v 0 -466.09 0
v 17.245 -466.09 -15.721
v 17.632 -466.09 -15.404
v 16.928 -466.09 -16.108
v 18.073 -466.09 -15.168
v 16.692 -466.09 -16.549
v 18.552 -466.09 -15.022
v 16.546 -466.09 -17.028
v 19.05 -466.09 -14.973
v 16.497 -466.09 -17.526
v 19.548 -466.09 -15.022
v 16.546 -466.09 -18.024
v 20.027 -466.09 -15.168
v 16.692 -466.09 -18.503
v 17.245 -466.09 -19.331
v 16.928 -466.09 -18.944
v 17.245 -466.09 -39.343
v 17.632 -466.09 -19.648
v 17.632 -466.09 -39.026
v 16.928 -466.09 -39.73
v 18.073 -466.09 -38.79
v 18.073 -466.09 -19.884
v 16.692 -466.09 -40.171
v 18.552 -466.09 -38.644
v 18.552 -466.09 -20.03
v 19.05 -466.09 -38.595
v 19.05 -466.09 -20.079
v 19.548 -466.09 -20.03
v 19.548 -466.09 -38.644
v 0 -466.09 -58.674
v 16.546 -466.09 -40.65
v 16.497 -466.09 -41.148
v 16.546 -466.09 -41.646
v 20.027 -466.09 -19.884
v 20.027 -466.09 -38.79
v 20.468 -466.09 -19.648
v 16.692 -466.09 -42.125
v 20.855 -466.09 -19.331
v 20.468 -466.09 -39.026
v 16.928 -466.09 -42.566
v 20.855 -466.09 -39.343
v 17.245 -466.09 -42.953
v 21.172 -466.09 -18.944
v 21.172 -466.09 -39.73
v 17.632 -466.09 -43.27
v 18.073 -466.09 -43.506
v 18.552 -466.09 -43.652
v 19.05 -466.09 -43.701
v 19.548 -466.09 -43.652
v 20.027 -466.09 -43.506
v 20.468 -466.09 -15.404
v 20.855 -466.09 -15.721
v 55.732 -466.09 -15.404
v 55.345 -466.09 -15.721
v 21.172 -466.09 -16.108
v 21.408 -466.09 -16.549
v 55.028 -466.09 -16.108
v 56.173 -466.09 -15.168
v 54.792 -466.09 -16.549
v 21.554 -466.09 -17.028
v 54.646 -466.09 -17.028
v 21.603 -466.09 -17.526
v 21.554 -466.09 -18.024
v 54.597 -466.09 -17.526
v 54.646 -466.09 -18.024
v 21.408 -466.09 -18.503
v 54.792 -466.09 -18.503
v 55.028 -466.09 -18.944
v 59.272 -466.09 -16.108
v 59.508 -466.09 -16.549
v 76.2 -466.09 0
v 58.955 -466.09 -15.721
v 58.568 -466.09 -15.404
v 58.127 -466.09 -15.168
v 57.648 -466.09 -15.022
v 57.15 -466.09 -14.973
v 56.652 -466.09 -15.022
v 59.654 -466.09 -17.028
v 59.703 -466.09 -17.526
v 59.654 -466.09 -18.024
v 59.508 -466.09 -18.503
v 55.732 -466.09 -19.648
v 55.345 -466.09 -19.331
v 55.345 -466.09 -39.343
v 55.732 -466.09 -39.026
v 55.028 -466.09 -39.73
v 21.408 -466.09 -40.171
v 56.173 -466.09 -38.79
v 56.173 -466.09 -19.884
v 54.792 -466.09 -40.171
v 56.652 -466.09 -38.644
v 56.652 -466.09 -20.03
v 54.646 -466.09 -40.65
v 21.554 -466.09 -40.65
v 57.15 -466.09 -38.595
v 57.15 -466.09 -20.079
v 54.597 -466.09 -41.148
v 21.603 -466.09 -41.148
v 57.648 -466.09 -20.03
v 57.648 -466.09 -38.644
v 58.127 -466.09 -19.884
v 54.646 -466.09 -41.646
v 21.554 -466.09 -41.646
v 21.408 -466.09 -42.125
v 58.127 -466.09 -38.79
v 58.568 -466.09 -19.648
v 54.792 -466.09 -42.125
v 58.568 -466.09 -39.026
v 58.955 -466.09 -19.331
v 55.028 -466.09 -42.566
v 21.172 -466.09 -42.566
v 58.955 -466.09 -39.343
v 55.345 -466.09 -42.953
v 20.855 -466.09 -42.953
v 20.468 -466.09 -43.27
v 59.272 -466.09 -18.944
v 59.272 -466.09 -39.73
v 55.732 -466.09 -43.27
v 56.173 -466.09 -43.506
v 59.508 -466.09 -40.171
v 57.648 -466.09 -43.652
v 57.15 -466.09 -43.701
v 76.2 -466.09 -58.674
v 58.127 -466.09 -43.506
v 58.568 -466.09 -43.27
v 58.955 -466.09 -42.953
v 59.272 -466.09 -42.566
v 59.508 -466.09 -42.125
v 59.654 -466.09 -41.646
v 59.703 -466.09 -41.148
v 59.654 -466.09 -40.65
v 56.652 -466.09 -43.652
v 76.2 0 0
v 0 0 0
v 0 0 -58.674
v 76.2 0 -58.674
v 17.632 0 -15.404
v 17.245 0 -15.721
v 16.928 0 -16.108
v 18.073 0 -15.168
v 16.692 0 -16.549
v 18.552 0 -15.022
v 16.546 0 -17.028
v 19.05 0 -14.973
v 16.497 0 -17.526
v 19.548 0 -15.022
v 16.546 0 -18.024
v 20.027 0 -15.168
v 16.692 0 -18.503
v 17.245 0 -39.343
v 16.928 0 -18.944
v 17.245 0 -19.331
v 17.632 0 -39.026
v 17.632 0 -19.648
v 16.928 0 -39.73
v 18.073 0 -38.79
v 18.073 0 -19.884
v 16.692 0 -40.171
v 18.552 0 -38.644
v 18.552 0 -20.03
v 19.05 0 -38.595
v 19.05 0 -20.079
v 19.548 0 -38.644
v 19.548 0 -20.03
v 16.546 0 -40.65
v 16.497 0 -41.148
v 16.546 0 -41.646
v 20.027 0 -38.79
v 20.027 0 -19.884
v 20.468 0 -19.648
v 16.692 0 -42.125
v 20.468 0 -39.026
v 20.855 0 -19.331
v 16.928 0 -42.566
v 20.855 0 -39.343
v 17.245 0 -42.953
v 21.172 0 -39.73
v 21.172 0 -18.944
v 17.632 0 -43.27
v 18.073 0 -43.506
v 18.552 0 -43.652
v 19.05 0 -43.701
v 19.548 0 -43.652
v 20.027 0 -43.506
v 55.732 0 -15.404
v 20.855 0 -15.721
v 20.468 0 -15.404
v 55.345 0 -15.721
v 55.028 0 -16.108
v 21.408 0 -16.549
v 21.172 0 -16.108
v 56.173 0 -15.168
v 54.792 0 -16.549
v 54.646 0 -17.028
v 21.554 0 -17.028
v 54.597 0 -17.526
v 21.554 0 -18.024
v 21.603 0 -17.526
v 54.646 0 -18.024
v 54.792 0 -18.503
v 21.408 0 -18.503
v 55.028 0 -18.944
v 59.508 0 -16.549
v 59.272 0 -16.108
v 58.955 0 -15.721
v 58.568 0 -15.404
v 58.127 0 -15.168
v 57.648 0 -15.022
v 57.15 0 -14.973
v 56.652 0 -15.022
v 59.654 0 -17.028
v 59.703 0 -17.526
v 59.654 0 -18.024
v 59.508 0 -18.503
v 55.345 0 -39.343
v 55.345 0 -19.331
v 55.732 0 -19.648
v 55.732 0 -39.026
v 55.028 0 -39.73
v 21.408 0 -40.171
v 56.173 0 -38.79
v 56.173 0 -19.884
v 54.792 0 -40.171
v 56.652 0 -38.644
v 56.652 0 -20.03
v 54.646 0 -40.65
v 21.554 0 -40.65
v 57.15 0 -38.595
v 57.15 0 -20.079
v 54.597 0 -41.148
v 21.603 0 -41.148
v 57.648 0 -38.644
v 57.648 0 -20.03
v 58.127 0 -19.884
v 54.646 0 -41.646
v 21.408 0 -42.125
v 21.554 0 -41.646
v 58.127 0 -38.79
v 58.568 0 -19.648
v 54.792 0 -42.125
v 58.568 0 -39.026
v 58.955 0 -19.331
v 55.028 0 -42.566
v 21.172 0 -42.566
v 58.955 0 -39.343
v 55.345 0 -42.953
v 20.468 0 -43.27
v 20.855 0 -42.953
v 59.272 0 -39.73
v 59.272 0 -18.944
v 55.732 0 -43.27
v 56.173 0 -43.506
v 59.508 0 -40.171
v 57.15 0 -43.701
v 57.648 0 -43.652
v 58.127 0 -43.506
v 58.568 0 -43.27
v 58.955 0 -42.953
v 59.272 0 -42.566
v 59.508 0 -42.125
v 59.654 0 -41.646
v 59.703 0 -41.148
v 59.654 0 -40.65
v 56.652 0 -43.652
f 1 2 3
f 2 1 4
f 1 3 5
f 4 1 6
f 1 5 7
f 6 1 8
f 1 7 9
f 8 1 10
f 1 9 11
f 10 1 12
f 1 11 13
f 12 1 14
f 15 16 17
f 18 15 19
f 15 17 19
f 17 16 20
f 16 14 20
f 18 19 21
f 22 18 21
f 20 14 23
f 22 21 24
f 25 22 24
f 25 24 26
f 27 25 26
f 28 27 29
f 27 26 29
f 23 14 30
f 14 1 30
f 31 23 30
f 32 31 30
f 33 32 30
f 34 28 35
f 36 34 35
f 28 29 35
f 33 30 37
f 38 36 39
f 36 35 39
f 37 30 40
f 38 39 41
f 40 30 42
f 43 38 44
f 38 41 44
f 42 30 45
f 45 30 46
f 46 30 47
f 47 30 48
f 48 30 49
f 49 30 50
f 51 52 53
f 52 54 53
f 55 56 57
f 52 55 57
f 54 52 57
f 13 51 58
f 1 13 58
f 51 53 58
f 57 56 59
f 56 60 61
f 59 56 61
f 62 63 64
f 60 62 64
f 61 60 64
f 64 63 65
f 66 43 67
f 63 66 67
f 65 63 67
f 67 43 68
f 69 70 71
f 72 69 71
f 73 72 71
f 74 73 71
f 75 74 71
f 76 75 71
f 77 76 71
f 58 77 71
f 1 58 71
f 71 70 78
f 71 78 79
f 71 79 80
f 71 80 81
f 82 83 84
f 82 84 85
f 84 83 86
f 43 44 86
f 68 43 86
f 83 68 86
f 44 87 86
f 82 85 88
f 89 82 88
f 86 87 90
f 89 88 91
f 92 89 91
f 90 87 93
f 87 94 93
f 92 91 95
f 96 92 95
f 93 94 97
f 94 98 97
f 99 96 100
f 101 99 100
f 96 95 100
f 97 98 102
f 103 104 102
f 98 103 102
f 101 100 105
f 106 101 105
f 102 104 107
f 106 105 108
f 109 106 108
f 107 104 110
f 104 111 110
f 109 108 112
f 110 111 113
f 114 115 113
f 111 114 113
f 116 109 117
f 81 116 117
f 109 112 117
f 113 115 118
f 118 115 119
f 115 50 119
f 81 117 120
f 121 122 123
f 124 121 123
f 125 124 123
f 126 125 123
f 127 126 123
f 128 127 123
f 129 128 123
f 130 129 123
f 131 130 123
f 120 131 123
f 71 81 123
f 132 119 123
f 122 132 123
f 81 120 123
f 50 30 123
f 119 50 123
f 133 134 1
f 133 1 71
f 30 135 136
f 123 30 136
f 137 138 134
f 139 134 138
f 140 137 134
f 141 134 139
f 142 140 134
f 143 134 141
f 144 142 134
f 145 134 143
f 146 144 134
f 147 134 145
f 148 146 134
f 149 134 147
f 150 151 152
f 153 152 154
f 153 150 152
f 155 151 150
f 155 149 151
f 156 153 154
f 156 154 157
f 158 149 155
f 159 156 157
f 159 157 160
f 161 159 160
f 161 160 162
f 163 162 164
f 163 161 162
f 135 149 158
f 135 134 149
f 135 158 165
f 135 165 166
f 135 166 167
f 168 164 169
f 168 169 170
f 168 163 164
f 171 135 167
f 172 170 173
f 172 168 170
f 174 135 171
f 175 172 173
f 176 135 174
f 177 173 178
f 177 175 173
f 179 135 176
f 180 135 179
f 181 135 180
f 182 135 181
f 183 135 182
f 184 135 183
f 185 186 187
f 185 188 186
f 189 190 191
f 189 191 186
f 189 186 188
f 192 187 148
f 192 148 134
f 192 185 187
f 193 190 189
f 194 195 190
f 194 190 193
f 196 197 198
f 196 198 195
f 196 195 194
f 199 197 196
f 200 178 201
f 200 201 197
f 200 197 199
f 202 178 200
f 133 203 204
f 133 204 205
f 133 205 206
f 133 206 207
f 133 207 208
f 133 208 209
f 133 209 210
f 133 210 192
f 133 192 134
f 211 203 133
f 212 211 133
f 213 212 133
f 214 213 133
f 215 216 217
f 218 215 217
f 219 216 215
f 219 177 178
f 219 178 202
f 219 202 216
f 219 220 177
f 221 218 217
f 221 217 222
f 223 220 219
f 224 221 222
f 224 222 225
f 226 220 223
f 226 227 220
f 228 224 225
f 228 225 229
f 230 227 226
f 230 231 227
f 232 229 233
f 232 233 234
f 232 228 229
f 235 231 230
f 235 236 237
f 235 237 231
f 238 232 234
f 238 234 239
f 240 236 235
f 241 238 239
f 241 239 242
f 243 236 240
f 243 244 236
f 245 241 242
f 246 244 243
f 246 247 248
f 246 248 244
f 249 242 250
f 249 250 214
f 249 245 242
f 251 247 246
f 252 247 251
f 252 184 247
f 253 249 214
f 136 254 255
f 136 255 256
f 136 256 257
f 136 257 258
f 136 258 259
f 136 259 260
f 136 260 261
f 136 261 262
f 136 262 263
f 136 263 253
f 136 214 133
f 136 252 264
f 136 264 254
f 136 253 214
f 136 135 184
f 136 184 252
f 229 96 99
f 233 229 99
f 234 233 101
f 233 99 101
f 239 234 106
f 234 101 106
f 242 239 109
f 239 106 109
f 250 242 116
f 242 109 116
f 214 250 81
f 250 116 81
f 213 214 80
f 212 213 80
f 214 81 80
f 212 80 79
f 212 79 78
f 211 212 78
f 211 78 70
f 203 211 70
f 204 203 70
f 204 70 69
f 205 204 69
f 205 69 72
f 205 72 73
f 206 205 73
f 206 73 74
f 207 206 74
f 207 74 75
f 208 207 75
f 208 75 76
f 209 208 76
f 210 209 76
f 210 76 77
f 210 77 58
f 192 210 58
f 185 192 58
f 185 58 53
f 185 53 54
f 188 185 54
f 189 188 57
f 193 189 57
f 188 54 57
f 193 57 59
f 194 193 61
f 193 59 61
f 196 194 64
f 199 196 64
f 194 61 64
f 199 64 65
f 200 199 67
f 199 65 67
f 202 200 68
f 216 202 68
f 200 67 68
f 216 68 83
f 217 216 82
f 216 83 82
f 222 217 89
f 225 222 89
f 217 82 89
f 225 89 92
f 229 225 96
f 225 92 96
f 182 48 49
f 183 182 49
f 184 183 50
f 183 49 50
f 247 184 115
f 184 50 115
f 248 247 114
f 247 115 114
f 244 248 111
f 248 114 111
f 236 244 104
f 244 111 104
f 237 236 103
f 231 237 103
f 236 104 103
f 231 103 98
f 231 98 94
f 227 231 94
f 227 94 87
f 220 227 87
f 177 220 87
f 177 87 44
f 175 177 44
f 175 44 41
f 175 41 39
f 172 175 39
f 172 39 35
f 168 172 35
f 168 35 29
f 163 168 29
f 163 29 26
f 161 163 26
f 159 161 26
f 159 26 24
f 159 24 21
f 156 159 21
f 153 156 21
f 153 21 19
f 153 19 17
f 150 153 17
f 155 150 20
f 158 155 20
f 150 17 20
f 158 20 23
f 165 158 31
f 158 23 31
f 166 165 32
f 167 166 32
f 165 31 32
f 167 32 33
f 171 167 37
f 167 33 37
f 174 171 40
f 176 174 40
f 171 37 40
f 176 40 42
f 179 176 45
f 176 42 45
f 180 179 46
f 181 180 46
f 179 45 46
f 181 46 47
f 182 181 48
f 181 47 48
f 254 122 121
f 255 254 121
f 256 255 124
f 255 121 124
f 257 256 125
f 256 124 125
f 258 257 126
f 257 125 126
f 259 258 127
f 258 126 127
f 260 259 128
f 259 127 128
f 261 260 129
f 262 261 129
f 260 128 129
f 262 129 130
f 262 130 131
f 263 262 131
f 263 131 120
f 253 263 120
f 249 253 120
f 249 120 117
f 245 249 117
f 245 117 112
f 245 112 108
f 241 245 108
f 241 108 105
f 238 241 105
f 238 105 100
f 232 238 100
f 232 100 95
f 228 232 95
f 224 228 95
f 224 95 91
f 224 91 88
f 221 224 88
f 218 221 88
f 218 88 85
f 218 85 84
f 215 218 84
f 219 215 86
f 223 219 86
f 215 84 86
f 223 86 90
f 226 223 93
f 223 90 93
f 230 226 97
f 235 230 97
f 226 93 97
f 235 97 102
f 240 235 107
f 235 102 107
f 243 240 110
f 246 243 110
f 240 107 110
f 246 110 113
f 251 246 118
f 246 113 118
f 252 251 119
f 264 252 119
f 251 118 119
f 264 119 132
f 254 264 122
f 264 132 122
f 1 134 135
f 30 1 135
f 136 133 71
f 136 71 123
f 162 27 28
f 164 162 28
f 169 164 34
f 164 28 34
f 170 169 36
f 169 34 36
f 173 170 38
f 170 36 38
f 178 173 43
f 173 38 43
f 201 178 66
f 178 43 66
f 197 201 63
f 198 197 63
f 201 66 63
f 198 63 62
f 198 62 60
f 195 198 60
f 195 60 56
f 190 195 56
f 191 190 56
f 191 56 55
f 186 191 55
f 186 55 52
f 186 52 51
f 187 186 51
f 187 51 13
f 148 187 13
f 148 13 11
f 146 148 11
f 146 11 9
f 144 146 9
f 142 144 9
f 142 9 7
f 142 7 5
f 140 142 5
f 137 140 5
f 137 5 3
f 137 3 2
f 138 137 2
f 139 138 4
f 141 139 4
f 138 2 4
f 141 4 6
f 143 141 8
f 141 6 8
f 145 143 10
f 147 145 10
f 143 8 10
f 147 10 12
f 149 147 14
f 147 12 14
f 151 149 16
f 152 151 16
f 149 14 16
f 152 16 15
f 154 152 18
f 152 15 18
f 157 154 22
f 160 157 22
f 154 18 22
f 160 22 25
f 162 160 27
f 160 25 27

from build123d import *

# Parameters (mm, degrees)
SKETCH1_W               = 76.2
SKETCH1_H               = 58.674
BOSS_EXTRUDE1_DEPTH     = 466.09
F_1_4_20_TAPPED_HOLE1_D = 5.1054


with BuildPart() as part:
    # Sketch1 → Boss-Extrude1 (new body)
    with BuildSketch(Plane(origin=(0, 0, 0), x_dir=(1, 0, 0), z_dir=(0, 1, 0))):
        with Locations((38.1, 29.337)):
            Rectangle(SKETCH1_W, SKETCH1_H)
    extrude(amount=-BOSS_EXTRUDE1_DEPTH)

    # 1/4-20 Tapped Hole1 (through all)
    with Locations(Plane(origin=(57.15, 0, -41.148), x_dir=(0, 0, 1), z_dir=(0, 1, 0))):
        with Locations((0, 0), (23.622, 0), (0, -38.1), (23.622, -38.1), (-79.662554242, -14.323198742)):
            Hole(F_1_4_20_TAPPED_HOLE1_D / 2)


solid = part.part
